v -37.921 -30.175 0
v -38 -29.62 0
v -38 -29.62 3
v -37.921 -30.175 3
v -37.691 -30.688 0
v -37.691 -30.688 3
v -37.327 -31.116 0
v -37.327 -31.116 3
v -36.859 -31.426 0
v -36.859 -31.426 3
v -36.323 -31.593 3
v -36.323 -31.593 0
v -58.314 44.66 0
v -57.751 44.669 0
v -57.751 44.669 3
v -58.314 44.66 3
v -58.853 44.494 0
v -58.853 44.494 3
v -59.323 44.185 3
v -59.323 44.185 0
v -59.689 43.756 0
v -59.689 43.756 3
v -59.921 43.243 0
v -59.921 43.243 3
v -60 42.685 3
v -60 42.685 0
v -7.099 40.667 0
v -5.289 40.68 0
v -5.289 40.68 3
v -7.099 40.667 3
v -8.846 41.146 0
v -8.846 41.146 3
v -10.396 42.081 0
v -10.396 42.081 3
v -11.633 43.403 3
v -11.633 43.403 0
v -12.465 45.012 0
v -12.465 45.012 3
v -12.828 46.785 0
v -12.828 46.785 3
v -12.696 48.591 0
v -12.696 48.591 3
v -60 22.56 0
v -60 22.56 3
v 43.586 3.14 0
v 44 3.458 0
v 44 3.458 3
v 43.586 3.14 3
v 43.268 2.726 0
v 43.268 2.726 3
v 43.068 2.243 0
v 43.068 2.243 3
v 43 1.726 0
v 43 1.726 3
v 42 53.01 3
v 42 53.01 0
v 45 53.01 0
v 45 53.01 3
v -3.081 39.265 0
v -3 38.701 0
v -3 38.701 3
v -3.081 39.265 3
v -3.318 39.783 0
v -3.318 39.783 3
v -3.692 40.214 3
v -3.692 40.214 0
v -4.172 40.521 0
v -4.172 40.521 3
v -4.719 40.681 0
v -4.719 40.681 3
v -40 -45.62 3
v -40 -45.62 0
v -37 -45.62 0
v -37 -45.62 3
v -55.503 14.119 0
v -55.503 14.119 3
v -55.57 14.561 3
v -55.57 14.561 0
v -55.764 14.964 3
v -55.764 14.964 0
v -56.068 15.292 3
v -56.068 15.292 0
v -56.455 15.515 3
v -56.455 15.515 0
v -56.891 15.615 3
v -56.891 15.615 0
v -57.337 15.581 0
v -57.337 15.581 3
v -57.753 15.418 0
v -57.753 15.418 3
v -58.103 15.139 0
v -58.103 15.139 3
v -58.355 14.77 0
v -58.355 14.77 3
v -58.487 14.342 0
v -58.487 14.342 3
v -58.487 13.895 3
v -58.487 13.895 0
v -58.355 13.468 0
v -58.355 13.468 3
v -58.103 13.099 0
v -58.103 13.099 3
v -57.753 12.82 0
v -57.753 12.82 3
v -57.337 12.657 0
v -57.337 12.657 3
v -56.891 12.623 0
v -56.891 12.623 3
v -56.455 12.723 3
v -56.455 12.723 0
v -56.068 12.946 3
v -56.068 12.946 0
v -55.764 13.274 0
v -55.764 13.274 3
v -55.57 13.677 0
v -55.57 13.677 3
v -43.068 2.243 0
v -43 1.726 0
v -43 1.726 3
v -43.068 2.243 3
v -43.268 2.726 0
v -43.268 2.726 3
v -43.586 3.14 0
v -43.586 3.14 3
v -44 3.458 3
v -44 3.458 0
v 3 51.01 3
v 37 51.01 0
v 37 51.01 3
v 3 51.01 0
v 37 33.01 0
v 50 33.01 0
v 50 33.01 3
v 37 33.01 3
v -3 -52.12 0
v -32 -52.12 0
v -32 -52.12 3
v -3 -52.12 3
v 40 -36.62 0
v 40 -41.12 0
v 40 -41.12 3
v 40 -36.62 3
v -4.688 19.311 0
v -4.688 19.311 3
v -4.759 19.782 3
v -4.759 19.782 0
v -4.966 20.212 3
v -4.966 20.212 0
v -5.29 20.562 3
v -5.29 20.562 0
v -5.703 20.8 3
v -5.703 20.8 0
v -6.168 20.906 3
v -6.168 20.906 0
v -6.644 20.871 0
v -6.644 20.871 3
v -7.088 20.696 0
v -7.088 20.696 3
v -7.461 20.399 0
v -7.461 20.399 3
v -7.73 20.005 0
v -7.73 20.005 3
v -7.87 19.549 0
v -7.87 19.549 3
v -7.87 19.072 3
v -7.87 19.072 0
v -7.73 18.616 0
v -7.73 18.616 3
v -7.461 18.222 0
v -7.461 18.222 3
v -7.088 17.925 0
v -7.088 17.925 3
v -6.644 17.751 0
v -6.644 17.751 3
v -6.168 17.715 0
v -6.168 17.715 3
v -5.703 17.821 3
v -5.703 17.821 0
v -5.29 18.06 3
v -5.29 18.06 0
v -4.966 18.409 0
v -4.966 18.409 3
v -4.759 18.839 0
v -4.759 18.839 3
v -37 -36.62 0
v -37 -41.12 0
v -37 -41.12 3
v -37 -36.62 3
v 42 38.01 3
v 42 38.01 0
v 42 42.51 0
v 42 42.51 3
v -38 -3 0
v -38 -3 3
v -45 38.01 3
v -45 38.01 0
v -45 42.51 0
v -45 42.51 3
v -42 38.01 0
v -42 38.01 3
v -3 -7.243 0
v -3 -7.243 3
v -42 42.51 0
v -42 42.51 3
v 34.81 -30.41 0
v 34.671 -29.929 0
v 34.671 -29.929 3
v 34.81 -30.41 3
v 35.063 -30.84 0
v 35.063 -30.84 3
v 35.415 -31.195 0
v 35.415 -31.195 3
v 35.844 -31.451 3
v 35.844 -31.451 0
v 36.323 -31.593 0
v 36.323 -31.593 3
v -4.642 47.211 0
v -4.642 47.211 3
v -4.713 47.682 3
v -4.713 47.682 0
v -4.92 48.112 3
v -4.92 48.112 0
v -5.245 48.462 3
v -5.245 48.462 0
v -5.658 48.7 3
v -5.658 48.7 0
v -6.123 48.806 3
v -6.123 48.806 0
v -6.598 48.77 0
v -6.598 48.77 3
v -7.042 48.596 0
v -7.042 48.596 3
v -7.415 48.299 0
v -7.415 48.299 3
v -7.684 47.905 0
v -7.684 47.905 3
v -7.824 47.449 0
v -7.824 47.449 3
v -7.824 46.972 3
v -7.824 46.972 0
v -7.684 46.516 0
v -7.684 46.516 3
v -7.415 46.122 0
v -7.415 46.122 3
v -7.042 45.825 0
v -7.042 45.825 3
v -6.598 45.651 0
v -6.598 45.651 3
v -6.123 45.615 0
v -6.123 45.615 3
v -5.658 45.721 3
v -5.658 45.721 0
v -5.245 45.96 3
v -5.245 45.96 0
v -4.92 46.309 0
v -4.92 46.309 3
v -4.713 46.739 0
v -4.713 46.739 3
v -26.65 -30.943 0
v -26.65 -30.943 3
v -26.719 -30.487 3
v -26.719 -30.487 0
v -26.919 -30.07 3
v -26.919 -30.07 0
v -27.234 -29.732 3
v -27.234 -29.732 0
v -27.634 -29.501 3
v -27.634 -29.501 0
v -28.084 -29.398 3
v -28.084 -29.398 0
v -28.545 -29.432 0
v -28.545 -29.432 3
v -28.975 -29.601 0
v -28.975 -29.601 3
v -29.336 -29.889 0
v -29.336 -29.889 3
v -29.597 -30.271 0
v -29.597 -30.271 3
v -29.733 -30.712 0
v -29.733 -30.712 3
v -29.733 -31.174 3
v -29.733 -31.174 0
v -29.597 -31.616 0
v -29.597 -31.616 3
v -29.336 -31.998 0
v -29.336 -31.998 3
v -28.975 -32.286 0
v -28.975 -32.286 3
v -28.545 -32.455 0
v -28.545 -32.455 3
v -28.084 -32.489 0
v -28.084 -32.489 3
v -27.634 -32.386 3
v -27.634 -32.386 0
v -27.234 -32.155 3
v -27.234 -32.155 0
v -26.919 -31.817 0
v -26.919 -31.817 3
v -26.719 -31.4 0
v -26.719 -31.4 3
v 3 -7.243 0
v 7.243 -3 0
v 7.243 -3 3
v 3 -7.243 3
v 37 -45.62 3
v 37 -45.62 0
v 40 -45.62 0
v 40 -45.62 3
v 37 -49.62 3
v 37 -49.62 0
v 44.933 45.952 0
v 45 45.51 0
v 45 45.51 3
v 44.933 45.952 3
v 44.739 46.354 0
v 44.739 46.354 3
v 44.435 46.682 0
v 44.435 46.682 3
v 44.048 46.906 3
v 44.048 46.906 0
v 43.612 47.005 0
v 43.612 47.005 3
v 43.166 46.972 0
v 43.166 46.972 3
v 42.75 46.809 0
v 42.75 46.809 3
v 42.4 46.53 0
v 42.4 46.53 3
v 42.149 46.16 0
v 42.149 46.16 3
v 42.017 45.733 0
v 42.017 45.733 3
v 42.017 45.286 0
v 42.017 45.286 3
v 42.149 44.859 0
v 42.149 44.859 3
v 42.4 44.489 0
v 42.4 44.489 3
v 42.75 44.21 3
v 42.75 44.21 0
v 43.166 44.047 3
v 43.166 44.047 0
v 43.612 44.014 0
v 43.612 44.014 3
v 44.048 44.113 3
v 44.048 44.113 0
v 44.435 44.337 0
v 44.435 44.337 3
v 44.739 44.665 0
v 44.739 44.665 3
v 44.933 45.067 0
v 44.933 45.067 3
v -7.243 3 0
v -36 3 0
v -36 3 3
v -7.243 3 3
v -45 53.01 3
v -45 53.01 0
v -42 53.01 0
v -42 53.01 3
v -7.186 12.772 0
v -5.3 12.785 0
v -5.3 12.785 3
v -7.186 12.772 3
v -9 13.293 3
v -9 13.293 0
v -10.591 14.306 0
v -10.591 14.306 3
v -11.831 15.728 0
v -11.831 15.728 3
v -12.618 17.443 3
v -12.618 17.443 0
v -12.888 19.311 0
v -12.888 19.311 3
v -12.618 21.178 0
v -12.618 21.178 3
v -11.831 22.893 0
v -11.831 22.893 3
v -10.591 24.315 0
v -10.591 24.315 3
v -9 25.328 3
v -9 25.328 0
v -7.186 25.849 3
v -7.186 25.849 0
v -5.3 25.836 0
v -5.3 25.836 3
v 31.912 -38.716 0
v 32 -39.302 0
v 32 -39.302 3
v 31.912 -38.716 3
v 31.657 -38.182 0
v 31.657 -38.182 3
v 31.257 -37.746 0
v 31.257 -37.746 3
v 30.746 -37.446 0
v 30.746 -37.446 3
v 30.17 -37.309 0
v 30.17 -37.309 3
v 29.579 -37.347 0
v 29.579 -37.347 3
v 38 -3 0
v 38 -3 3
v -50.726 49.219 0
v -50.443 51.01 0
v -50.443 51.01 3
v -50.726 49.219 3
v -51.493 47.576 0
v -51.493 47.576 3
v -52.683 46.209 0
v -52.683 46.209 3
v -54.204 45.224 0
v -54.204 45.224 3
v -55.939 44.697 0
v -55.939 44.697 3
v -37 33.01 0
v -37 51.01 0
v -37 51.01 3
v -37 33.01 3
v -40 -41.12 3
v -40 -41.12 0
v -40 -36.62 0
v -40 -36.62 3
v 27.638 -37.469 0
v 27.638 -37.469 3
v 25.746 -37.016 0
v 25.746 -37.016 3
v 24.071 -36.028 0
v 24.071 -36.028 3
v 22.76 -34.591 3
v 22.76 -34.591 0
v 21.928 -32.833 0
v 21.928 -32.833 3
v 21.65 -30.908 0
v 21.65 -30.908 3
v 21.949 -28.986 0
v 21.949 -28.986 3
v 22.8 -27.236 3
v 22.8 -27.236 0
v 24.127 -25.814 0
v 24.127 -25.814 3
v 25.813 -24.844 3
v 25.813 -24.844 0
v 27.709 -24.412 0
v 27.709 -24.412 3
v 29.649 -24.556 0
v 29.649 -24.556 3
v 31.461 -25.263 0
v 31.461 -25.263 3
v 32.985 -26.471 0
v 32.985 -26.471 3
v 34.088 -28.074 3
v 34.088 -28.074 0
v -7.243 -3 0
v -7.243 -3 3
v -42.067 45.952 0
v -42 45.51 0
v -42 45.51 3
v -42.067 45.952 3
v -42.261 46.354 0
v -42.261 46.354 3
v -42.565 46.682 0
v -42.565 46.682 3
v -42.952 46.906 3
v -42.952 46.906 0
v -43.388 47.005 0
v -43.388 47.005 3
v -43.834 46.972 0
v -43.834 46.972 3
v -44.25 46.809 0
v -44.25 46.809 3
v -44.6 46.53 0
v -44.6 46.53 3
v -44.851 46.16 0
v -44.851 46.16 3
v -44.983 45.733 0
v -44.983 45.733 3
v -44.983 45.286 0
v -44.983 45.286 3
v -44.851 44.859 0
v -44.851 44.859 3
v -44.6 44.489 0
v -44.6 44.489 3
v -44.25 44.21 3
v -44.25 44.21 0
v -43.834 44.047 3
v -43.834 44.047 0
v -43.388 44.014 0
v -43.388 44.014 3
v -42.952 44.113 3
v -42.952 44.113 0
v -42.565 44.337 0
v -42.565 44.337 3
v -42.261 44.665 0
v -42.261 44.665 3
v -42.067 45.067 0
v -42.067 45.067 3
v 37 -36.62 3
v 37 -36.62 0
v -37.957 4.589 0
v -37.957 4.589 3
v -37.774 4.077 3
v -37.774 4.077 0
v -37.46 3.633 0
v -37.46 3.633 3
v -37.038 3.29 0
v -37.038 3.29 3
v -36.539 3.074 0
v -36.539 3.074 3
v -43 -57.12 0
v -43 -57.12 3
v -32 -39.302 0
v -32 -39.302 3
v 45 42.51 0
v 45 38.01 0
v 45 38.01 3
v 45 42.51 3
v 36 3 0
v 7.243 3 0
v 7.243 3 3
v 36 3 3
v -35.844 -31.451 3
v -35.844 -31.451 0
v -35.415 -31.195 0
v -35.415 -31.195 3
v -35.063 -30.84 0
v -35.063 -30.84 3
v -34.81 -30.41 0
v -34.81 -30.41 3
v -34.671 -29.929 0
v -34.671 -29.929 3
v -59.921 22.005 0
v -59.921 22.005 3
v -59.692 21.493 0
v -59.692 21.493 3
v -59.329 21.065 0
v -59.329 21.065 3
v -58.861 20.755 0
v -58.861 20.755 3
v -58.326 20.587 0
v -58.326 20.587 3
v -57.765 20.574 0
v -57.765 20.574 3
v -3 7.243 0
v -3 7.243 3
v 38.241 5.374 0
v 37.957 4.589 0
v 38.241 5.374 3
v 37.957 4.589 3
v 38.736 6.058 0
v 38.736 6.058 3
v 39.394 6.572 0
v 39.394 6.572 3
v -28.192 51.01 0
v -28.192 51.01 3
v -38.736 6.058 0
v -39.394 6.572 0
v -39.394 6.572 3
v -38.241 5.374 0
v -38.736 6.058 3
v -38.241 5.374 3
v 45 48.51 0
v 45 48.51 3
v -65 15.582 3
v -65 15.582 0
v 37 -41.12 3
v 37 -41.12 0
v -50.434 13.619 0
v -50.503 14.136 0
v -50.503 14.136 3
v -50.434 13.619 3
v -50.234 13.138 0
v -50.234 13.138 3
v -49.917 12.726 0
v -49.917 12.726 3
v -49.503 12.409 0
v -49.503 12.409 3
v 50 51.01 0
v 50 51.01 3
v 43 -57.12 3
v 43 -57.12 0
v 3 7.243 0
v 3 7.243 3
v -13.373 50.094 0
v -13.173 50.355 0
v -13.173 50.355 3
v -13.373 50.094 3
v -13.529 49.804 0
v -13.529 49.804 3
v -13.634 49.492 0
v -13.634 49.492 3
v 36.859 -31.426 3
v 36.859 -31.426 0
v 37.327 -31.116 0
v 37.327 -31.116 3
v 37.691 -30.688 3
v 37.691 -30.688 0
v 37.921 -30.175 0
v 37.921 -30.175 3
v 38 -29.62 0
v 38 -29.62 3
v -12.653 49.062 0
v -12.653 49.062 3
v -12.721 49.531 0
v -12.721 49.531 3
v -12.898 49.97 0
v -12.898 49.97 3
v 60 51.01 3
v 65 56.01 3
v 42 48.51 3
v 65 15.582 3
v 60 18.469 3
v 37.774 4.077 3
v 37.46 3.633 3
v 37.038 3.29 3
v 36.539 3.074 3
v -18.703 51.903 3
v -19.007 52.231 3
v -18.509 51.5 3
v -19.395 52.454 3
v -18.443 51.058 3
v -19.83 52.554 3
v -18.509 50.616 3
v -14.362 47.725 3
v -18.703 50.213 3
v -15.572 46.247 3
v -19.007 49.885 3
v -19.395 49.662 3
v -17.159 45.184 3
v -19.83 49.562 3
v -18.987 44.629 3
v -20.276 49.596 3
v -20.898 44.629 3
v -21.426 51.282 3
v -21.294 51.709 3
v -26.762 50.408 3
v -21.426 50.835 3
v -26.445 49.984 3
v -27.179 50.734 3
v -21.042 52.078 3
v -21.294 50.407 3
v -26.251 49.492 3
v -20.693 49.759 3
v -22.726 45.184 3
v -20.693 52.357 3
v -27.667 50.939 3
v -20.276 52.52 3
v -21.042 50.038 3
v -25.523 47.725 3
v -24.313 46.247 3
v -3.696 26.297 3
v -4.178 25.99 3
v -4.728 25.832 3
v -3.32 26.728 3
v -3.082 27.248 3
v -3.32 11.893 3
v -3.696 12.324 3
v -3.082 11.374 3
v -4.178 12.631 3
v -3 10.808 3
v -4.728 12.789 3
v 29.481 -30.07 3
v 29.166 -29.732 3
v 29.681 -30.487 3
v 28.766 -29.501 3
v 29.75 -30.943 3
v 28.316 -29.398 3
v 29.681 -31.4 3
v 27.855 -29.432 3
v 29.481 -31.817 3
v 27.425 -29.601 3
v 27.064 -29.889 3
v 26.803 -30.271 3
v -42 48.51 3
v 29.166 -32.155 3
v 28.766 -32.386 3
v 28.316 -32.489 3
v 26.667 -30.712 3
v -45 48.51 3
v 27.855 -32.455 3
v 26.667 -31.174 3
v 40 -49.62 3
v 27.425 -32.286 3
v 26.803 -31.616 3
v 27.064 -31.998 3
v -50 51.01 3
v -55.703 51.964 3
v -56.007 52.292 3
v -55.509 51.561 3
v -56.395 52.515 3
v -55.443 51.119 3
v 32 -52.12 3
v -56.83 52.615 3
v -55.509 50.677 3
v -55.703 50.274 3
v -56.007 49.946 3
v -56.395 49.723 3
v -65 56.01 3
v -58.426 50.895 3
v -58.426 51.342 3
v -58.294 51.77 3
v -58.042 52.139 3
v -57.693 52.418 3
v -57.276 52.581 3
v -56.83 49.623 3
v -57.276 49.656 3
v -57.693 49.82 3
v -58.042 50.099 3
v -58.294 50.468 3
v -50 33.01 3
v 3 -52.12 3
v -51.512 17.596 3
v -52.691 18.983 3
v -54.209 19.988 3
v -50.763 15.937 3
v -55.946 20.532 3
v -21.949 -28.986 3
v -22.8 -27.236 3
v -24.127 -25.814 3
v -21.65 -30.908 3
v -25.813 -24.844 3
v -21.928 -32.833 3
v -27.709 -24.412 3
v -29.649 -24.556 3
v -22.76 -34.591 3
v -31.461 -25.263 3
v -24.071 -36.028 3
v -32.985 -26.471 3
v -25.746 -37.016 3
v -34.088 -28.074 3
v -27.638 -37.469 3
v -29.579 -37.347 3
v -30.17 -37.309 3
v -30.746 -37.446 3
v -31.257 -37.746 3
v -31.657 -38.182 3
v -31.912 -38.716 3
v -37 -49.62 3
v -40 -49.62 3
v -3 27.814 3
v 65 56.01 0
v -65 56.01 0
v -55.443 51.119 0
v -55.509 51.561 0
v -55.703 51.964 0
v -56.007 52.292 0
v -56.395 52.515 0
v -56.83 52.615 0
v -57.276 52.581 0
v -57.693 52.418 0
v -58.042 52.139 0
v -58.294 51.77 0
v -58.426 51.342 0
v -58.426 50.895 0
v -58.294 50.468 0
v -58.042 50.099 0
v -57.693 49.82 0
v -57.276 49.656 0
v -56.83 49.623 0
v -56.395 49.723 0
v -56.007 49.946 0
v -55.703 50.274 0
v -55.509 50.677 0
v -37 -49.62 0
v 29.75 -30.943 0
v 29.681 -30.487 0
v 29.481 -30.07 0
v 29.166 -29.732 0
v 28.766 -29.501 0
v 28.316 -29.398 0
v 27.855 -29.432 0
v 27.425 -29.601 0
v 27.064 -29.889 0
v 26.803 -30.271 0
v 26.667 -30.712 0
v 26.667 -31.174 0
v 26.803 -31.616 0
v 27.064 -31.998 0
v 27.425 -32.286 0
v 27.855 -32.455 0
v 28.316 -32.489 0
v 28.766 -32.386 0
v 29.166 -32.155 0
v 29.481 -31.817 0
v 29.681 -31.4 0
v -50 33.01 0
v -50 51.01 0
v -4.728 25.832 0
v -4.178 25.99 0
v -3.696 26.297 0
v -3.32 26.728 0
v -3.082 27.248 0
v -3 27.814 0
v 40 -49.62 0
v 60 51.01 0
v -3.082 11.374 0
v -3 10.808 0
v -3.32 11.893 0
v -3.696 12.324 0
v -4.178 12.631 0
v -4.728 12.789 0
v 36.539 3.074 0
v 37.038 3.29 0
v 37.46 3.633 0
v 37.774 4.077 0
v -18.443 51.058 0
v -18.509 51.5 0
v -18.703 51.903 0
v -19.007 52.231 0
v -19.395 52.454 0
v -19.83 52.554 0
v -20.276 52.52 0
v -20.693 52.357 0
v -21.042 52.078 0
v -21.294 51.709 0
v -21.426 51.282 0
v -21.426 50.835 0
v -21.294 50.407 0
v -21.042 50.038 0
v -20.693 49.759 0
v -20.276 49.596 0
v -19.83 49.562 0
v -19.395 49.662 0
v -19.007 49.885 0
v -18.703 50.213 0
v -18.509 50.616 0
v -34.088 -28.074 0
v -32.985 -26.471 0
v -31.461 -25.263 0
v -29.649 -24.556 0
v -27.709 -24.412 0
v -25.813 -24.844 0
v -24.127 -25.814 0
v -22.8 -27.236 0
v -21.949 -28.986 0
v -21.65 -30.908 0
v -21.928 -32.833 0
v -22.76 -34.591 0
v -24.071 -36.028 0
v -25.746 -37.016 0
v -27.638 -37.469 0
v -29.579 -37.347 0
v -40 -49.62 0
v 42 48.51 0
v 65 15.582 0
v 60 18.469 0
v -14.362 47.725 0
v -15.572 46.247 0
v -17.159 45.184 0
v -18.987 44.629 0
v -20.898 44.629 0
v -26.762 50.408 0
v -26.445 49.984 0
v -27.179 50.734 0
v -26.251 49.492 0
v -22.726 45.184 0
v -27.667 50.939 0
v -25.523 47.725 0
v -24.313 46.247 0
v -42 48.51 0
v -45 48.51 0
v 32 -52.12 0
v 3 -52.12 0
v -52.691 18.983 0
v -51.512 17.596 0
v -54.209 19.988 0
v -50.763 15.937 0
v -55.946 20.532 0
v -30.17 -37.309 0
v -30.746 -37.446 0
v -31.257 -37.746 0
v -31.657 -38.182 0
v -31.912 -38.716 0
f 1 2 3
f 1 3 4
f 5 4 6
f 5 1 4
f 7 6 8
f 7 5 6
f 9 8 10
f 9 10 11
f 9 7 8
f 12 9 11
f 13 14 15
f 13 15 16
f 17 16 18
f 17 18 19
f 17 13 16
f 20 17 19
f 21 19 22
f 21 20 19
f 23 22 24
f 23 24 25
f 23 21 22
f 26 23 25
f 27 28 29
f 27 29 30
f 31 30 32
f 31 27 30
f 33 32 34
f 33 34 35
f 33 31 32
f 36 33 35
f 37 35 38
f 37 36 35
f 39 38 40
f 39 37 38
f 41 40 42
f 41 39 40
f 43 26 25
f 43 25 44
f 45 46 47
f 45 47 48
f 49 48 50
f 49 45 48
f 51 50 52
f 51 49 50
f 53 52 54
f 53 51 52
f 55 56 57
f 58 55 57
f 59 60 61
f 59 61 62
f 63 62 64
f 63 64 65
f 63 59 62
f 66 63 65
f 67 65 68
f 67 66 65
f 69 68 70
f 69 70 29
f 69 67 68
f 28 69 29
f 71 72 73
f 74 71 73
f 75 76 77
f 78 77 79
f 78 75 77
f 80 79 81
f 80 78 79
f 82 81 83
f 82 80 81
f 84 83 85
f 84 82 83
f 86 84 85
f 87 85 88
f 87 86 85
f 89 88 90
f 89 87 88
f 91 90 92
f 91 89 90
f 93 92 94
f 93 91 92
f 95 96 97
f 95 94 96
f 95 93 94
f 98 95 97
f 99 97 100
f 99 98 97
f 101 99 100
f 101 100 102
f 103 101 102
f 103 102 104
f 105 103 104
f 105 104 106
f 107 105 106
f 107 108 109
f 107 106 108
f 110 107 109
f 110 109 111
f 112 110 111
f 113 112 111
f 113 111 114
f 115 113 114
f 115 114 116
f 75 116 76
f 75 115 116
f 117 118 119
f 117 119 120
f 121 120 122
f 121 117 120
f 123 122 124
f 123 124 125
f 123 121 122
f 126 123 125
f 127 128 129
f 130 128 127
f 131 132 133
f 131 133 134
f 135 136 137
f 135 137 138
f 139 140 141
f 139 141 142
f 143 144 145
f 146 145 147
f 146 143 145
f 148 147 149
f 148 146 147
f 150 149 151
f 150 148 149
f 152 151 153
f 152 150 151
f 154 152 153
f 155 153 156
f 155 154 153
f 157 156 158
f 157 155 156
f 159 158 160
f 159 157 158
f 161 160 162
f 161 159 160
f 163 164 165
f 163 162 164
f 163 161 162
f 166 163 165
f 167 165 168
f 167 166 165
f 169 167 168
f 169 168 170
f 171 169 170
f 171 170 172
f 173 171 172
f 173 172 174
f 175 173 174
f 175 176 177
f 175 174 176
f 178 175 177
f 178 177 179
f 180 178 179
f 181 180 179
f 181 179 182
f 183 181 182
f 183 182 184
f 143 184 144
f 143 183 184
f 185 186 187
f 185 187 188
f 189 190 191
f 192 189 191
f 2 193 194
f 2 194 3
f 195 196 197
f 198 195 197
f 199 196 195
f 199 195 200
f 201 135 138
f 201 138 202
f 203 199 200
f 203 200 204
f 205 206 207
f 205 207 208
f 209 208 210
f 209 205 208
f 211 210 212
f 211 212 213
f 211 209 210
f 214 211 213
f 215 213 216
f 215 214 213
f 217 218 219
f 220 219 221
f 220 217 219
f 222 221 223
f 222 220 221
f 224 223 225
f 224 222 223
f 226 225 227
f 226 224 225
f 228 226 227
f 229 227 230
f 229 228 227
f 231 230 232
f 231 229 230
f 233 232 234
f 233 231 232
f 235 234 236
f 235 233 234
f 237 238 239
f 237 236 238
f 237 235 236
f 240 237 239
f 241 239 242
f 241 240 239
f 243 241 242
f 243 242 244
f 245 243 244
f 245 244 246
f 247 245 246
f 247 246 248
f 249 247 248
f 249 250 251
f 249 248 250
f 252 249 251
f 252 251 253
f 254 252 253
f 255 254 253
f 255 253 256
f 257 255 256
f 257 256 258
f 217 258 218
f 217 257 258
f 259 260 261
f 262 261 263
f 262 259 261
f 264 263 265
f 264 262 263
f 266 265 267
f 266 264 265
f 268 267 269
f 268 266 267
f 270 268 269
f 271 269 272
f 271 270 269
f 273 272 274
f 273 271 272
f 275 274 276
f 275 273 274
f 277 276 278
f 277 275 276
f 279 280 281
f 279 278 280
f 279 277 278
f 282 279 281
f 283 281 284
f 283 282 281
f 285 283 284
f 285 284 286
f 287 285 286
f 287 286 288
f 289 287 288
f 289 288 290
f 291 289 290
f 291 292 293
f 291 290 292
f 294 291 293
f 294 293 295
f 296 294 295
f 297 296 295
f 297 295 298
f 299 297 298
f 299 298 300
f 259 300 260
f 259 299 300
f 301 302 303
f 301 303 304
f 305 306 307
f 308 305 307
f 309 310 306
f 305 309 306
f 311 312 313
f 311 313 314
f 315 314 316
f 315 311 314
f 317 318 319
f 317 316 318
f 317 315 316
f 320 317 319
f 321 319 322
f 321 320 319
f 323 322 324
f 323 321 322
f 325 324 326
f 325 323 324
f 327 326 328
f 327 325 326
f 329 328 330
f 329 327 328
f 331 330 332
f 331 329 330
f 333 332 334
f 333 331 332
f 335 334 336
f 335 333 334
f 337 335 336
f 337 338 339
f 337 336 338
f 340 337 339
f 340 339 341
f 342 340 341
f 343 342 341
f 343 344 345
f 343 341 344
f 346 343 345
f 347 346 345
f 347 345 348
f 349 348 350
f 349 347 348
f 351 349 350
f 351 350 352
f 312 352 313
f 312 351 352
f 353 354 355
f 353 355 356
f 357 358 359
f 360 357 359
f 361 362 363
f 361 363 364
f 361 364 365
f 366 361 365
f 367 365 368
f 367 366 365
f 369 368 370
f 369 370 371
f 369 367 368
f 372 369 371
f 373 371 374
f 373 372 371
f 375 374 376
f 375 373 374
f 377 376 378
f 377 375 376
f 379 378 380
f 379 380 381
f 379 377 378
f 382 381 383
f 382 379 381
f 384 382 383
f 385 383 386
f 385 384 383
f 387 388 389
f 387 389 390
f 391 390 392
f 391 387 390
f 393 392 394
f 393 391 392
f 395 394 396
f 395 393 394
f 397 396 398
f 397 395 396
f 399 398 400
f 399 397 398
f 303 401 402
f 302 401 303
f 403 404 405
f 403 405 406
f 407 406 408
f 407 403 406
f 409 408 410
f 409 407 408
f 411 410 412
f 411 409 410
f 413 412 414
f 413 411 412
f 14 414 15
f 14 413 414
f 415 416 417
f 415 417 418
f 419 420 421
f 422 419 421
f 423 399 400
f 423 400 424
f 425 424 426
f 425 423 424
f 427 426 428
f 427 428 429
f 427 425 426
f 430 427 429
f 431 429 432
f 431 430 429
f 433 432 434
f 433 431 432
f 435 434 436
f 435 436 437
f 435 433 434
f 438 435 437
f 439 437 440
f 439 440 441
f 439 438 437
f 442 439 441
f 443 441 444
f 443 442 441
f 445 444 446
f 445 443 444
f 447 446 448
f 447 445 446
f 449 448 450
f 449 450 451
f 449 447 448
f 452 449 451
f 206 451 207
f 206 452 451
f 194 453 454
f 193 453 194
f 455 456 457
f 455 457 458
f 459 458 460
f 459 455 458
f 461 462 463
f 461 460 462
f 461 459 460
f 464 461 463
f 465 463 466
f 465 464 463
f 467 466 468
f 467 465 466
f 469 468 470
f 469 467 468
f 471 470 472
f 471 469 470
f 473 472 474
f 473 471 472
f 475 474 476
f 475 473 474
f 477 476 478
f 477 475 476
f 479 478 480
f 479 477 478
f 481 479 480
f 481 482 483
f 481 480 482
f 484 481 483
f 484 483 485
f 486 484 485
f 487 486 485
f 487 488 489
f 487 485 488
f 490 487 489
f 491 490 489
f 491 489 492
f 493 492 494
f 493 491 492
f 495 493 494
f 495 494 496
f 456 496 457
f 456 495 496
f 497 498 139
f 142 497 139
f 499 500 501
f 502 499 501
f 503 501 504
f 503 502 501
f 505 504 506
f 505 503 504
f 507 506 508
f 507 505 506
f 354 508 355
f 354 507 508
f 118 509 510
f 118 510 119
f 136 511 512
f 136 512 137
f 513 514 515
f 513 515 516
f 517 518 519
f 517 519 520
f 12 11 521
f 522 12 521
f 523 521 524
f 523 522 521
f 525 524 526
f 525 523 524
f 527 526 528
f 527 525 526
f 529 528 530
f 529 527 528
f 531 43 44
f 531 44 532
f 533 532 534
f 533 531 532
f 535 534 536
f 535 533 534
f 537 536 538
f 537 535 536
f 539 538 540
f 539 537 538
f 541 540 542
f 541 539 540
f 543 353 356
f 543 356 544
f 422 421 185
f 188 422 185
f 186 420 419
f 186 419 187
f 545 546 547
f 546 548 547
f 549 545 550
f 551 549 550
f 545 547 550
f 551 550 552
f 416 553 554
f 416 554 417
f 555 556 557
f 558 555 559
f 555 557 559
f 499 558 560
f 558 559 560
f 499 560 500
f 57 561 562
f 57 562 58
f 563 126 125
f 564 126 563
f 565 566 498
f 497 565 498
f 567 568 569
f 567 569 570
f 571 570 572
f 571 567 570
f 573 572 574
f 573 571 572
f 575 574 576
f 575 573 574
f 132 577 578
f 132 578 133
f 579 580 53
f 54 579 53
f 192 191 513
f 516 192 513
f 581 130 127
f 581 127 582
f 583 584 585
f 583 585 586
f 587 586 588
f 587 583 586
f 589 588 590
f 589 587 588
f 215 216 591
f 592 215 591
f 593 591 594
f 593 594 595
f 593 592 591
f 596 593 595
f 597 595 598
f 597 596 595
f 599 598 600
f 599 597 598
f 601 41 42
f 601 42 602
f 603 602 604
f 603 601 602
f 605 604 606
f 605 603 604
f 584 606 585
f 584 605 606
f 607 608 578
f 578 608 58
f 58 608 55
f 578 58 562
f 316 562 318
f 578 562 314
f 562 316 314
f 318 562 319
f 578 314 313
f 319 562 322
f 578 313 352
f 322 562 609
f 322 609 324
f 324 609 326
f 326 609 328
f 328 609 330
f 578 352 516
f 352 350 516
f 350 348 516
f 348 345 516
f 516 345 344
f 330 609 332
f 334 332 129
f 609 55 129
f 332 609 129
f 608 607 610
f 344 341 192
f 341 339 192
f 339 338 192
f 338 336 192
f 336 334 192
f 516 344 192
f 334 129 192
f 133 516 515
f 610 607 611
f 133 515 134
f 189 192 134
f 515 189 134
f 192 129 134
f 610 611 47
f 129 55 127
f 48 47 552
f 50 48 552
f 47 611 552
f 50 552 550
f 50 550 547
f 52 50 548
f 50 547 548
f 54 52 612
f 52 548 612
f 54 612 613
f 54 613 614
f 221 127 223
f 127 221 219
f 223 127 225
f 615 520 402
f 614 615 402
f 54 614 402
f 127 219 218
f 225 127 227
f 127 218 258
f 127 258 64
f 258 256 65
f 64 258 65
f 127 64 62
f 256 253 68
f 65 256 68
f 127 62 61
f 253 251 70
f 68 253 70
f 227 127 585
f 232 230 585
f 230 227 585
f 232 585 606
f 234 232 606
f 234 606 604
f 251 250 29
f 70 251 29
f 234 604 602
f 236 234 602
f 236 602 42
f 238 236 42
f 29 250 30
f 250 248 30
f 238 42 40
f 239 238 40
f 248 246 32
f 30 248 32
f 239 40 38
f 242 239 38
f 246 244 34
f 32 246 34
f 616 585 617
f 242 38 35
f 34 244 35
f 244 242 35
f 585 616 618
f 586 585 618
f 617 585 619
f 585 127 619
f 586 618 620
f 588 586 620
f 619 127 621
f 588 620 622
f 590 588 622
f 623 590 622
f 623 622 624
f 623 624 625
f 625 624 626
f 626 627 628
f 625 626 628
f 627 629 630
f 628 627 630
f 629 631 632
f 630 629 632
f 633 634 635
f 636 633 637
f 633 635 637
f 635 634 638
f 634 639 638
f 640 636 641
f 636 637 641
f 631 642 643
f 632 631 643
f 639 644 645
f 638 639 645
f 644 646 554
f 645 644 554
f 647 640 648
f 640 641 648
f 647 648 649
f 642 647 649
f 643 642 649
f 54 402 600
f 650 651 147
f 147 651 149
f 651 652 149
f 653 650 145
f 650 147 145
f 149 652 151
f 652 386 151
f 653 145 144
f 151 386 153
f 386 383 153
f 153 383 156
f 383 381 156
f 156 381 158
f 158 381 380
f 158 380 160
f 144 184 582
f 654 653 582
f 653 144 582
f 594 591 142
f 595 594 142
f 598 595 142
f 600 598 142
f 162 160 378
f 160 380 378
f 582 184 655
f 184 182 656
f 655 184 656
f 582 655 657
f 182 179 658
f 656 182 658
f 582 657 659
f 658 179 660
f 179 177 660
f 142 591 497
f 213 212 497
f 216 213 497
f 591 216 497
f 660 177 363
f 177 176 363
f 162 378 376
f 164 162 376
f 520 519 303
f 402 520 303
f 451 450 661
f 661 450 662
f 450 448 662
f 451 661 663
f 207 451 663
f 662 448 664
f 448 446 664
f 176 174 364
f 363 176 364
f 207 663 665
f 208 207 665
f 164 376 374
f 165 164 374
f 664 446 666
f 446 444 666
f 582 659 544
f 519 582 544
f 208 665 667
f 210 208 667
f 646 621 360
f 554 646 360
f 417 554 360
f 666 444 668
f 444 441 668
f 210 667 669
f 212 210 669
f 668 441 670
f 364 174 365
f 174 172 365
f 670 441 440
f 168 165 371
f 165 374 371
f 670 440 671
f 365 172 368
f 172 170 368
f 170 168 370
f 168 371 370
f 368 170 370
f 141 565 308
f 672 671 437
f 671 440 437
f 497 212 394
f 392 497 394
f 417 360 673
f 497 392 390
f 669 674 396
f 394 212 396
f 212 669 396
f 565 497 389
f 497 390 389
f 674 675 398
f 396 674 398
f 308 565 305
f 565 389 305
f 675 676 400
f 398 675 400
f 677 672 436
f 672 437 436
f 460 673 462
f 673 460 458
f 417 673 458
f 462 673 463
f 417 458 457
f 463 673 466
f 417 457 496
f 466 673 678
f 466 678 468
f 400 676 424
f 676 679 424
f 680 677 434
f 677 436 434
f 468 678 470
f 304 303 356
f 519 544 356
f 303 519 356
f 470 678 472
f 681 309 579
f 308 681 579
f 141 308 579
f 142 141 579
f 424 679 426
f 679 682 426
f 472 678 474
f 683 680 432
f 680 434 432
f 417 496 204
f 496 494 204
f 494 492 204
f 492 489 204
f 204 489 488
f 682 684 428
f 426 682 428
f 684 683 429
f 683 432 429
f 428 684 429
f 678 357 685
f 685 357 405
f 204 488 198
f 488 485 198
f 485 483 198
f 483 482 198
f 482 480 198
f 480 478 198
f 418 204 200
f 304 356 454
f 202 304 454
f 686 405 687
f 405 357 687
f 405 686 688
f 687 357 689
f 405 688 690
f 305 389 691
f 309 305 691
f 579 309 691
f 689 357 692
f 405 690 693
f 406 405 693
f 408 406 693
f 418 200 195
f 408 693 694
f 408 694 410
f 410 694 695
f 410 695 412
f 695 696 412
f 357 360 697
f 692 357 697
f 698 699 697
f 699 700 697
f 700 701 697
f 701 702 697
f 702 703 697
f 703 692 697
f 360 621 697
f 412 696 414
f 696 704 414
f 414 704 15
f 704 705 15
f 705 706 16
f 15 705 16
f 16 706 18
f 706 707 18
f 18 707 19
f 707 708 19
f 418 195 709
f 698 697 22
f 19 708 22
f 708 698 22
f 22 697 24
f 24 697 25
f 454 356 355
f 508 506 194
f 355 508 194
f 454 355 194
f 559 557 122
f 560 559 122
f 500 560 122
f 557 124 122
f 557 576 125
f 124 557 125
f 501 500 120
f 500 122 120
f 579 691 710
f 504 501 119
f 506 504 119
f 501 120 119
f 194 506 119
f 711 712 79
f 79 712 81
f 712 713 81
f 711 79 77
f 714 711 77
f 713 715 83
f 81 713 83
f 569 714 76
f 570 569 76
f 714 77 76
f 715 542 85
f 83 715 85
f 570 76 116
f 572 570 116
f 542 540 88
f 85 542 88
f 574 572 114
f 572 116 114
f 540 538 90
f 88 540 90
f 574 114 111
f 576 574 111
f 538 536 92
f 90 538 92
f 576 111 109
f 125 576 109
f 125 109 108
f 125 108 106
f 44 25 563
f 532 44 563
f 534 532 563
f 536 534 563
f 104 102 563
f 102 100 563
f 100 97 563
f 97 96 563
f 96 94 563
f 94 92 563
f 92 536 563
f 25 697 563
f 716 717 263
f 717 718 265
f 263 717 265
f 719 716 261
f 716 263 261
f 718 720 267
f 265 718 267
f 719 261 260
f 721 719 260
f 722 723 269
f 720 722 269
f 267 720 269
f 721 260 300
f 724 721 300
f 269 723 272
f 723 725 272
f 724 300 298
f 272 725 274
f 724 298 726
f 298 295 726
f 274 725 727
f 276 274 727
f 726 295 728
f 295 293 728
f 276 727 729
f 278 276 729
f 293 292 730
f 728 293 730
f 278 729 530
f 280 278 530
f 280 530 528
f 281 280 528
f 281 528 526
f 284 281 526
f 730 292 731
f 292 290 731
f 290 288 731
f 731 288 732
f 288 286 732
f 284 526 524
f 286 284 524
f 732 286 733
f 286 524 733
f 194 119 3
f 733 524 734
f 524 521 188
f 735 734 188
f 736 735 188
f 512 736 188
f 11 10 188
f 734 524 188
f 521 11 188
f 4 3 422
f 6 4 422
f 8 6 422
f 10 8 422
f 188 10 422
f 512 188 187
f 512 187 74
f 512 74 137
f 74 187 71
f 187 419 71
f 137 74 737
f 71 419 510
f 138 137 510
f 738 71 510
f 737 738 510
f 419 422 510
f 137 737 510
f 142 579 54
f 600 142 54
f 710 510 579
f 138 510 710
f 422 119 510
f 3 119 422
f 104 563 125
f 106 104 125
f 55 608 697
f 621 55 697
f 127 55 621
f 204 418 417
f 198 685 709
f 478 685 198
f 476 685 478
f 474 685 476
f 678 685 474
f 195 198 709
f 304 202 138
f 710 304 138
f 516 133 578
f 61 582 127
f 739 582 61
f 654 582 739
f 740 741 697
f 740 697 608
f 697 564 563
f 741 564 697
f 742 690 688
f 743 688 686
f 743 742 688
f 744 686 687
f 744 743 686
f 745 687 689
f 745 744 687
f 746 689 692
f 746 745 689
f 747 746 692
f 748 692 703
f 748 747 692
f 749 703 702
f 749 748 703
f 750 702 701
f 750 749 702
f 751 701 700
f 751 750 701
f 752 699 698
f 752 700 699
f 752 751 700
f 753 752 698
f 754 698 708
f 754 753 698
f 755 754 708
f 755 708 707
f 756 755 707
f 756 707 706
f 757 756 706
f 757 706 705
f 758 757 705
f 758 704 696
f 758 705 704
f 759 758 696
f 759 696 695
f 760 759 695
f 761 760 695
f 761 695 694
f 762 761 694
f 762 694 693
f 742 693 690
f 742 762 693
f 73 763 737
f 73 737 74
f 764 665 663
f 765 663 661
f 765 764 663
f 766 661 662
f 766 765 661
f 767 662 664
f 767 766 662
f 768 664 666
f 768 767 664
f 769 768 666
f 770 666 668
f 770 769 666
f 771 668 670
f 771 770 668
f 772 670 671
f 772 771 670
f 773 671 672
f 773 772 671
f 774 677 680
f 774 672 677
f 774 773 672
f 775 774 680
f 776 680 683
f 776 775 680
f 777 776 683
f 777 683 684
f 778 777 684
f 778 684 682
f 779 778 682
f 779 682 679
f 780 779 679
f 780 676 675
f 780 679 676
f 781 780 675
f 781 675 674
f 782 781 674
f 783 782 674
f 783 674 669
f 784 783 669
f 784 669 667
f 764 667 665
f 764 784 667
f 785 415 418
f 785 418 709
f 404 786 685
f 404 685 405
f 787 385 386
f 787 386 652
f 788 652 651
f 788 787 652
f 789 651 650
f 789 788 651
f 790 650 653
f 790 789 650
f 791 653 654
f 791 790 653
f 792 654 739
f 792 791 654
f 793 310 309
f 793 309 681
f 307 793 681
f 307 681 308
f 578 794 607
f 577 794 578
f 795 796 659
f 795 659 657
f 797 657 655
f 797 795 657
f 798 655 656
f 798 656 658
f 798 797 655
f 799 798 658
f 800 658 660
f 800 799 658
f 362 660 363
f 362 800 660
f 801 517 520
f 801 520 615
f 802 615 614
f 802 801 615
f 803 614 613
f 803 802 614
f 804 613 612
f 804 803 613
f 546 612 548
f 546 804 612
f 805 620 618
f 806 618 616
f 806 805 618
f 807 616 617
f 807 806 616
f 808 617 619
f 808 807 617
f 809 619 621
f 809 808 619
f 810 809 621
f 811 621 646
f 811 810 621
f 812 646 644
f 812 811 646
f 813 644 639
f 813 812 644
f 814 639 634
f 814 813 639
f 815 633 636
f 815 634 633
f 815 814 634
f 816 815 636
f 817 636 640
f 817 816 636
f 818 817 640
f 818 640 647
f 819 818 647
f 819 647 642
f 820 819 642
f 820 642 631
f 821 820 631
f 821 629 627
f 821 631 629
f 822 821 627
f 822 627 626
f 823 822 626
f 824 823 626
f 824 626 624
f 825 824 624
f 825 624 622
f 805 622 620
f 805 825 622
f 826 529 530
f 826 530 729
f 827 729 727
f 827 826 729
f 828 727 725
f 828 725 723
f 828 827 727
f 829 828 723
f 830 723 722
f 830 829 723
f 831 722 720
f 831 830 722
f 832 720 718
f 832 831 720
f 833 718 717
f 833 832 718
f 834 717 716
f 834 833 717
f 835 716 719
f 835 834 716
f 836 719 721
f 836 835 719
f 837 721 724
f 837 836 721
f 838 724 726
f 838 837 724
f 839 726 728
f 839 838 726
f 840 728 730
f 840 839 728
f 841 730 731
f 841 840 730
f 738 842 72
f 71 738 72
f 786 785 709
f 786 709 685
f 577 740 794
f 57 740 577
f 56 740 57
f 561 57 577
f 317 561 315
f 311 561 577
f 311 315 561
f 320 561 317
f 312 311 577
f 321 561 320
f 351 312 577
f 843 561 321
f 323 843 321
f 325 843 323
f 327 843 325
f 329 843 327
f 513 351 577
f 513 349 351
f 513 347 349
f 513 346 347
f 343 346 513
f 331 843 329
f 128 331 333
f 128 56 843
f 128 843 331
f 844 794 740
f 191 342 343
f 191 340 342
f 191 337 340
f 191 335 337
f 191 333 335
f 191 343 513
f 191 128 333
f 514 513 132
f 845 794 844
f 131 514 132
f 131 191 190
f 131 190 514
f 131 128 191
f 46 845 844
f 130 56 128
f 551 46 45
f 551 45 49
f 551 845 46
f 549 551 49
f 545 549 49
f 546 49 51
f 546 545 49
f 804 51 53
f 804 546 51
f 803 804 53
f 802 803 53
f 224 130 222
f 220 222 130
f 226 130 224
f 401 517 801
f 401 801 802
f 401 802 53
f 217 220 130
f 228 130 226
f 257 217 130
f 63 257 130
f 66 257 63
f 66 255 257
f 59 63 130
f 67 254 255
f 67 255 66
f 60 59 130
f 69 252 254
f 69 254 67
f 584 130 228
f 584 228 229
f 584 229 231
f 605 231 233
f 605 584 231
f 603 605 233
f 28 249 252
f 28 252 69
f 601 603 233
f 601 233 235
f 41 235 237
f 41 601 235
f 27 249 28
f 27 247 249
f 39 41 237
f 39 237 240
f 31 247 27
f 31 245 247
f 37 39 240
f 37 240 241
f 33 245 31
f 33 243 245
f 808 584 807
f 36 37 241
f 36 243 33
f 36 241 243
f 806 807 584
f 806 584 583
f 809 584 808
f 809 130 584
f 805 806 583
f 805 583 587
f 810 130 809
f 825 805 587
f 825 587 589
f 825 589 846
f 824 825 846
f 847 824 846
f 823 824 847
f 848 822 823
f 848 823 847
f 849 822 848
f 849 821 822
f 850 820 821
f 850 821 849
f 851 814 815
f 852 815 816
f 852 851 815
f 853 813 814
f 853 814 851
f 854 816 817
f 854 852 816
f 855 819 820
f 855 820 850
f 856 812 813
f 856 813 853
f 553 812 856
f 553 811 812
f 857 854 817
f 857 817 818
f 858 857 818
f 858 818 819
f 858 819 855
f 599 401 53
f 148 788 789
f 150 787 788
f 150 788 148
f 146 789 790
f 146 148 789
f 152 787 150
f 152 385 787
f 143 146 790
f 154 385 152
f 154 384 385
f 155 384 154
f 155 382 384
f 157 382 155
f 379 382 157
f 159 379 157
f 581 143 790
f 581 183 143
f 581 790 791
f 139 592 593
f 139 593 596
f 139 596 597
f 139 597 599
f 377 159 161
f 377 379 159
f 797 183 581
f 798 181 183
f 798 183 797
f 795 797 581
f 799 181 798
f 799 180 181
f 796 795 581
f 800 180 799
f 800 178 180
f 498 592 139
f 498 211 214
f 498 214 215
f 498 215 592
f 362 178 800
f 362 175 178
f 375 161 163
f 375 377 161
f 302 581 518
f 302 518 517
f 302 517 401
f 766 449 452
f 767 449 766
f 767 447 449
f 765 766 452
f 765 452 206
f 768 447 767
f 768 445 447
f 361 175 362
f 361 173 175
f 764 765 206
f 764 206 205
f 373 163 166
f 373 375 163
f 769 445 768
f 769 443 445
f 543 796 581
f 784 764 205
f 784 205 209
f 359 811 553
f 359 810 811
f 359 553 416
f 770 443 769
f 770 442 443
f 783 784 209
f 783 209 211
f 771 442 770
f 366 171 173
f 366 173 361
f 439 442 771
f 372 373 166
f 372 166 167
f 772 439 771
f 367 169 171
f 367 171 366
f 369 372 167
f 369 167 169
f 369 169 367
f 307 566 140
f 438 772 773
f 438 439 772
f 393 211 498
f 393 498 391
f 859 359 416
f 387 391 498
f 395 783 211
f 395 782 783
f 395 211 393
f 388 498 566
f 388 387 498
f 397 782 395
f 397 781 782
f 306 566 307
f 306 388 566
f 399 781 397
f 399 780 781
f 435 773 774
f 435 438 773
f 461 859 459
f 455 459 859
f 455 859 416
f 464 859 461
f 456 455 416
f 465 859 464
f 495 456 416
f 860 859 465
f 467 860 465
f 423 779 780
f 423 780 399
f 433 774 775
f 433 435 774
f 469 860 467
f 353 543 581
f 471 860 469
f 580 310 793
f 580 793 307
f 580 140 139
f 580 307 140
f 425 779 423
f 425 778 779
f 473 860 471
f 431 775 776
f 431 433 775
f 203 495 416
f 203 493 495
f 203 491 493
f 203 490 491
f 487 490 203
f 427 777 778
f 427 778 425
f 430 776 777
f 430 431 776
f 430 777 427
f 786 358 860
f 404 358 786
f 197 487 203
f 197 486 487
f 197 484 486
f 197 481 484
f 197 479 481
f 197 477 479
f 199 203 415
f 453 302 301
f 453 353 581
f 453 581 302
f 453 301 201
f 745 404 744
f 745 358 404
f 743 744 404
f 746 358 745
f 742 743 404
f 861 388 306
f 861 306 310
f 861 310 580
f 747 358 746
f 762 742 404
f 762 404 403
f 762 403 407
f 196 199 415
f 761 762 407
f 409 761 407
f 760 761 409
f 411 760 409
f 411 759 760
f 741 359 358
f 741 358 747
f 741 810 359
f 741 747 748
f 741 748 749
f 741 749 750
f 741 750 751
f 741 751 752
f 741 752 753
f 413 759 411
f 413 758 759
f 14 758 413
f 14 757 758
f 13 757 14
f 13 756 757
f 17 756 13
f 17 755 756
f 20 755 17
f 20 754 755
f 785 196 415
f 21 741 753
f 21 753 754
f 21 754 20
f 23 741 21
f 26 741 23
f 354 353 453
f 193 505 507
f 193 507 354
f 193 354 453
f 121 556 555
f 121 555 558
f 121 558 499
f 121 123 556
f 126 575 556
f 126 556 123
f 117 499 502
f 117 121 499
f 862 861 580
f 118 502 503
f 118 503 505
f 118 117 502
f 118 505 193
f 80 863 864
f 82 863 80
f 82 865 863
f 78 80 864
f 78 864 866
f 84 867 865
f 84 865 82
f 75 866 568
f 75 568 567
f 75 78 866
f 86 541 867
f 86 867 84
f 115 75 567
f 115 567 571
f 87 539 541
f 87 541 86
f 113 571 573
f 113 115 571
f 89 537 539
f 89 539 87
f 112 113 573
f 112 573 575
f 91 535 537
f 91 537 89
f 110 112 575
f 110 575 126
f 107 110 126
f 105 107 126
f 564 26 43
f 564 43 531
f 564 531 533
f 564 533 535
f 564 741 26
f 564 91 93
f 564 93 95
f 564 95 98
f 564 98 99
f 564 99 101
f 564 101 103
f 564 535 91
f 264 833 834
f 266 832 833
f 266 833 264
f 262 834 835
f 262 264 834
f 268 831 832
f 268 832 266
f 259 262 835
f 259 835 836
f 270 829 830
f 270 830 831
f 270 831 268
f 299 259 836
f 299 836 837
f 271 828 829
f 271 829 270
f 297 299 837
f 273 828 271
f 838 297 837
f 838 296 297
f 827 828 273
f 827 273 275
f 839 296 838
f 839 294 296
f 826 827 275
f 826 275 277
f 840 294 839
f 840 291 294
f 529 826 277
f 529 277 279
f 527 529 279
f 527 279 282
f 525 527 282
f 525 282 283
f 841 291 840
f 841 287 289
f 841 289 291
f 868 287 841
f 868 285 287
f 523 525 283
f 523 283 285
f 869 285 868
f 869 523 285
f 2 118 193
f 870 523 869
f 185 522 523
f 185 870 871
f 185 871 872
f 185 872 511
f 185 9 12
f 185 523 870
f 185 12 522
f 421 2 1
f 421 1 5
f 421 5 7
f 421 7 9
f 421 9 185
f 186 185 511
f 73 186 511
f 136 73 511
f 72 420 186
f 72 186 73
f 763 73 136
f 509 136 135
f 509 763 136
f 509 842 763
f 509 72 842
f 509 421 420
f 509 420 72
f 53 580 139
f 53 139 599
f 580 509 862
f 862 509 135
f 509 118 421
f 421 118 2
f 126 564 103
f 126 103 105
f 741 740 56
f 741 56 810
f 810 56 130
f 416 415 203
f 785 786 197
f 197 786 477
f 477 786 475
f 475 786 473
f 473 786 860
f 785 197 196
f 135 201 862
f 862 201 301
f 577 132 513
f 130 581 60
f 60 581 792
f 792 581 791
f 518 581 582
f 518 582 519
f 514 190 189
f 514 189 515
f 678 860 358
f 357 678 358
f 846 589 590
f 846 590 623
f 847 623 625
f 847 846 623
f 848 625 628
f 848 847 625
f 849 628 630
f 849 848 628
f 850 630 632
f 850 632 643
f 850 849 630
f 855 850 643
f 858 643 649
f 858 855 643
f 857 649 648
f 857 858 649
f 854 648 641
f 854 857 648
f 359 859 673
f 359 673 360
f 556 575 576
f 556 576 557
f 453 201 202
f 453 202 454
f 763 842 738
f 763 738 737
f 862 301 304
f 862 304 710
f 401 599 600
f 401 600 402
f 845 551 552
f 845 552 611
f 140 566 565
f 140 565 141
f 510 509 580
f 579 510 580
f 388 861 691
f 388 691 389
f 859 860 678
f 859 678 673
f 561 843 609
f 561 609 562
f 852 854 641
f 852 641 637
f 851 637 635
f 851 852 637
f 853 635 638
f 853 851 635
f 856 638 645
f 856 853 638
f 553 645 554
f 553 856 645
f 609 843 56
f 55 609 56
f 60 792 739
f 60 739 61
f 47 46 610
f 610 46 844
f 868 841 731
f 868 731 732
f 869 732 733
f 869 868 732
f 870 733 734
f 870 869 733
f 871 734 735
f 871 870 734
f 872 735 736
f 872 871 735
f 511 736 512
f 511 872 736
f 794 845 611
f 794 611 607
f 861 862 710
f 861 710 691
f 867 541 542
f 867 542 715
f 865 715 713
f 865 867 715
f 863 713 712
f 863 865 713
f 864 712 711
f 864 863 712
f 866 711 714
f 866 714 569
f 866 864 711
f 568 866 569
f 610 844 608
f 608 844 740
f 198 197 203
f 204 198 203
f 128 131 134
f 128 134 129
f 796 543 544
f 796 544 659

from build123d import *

# Parameters (mm, degrees)
CROQUIS1_W                 = 130
CROQUIS1_H                 = 113.129079584
CROQUIS1_W_2               = 3
CROQUIS1_H_2               = 1.5
CROQUIS1_H_3               = 4.5
SALIENTE_EXTRUIR1_DEPTH    = 3
CORTAR_EXTRUIR1_DEPTH      = 3
CROQUIS7_R                 = 1.55
CROQUIS7_R_2               = 1.6
CROQUIS7_R_3               = 1.5
CORTAR_EXTRUIR3_DEPTH      = 10
CORTAR_EXTRUIR4_DEPTH      = 10
CROQUIS9_W                 = 3
CROQUIS9_H                 = 4
CORTAR_EXTRUIR5_DEPTH      = 10
CORTAR_EXTRUIR6_DEPTH      = 87.58316764
CORTAR_EXTRUIR6_DEPTH_BACK = 87.58316764
CROQUIS10_R                = 1.5
REDONDEO1_R                = 2
REDONDEO2_R                = 3


with BuildPart() as part:
    # Croquis1 → Saliente-Extruir1 (new body)
    with BuildSketch(Plane.XY):
        with Locations((0, -0.555027071)):
            Rectangle(CROQUIS1_W, CROQUIS1_H)
        with Locations((38.5, -46.369566863)):
            Rectangle(CROQUIS1_W_2, CROQUIS1_H_2, mode=Mode.SUBTRACT)
        with Locations((-38.5, -46.369566863)):
            Rectangle(CROQUIS1_W_2, CROQUIS1_H_2, mode=Mode.SUBTRACT)
        with Locations((38.5, -38.869566863)):
            Rectangle(CROQUIS1_W_2, CROQUIS1_H_3, mode=Mode.SUBTRACT)
        with Locations((-38.5, -38.869566863)):
            Rectangle(CROQUIS1_W_2, CROQUIS1_H_3, mode=Mode.SUBTRACT)
        with Locations((43.5, 40.259512721)):
            Rectangle(CROQUIS1_W_2, CROQUIS1_H_3, mode=Mode.SUBTRACT)
        with Locations((43.5, 50.759512721)):
            Rectangle(CROQUIS1_W_2, CROQUIS1_H_3, mode=Mode.SUBTRACT)
        with Locations((-43.5, 40.259512721)):
            Rectangle(CROQUIS1_W_2, CROQUIS1_H_3, mode=Mode.SUBTRACT)
        with Locations((-43.5, 50.759512721)):
            Rectangle(CROQUIS1_W_2, CROQUIS1_H_3, mode=Mode.SUBTRACT)
    extrude(amount=SALIENTE_EXTRUIR1_DEPTH)

    # Croquis2 → Cortar-Extruir1 (cut)
    with BuildSketch(Plane.XY):
        Polygon((-43, -57.119566863), (-43, 2.880433137), (-65, 15.582139059), (-65, -57.119566863), align=None)
    cortar_extruir1 = extrude(amount=CORTAR_EXTRUIR1_DEPTH, mode=Mode.SUBTRACT)

    # Simetría1: Cortar-Extruir1 across plane
    add(cortar_extruir1.mirror(Plane(origin=(0, 0, 0), x_dir=(0, 0, 1), z_dir=(1, 0, 0))), mode=Mode.SUBTRACT)

    # Croquis7 → Cortar-Extruir3 (cut)
    with BuildSketch(Plane.XY):
        with Locations((-28.2, -30.943433351)):
            Circle(CROQUIS7_R)
        with Locations((28.2, -30.943433351)):
            Circle(CROQUIS7_R)
        with Locations((-6.242176561, 47.210601794)):
            Circle(CROQUIS7_R_2)
        with Locations((-6.287991701, 19.310639411)):
            Circle(CROQUIS7_R_2)
        with Locations((-57.003272906, 14.118912973)):
            Circle(CROQUIS7_R_3)
        with Locations((-19.942564364, 51.058104658)):
            Circle(CROQUIS7_R_3)
        with Locations((-56.942514477, 51.118863087)):
            Circle(CROQUIS7_R_3)
    extrude(amount=CORTAR_EXTRUIR3_DEPTH, mode=Mode.SUBTRACT)

    # Croquis8 → Cortar-Extruir4 (cut)
    with BuildSketch(Plane.XY):
        Polygon((37, 33.009512721), (37, 51.009512721), (3, 51.009512721), (3, 7.242640687), (7.242640687, 3), (38, 3), (38, 5.767184483), (60, 18.468890405), (60, 51.009512721), (50, 51.009512721), (50, 33.009512721), align=None)
        with BuildLine():
            Line((-7.242640687, 3), (-3, 7.242640687))
            Line((-3, 7.242640687), (-3, 13.58795555))
            ThreePointArc((-3, 13.58795555), (-12.887991701, 19.310639411), (-3, 25.033323272))
            Line((-3, 25.033323272), (-3, 41.461837479))
            ThreePointArc((-3, 41.461837479), (-11.136091988, 42.782329919), (-11.639238333, 51.009512721))
            Line((-11.639238333, 51.009512721), (-13.442745995, 51.009512721))
            ThreePointArc((-13.442745995, 51.009512721), (-19.942564364, 44.558104658), (-26.442382732, 51.009512721))
            Line((-26.442382732, 51.009512721), (-37, 51.009512721))
            Line((-37, 51.009512721), (-37, 33.009512721))
            Line((-37, 33.009512721), (-50, 33.009512721))
            Line((-50, 33.009512721), (-50, 51.009512721))
            Line((-50, 51.009512721), (-50.44343435, 51.009512721))
            ThreePointArc((-50.44343435, 51.009512721), (-53.644642278, 45.517609749), (-60, 45.382855566))
            Line((-60, 45.382855566), (-60, 19.886895872))
            ThreePointArc((-60, 19.886895872), (-53.177308637, 19.373624897), (-50.59374625, 13.03818727))
            Line((-50.59374625, 13.03818727), (-38, 5.767184483))
            Line((-38, 5.767184483), (-38, 3))
            Line((-38, 3), (-7.242640687, 3))
        make_face()
        with BuildLine():
            Line((38, -3), (7.242640687, -3))
            Line((7.242640687, -3), (3, -7.242640687))
            Line((3, -7.242640687), (3, -52.119566863))
            Line((3, -52.119566863), (32, -52.119566863))
            Line((32, -52.119566863), (32, -36.278459124))
            ThreePointArc((32, -36.278459124), (22.540832887, -27.64550558), (34.715009092, -31.619566863))
            Line((34.715009092, -31.619566863), (38, -31.619566863))
            Line((38, -31.619566863), (38, -3))
        make_face()
        with BuildLine():
            Line((-3, -7.242640687), (-7.242640687, -3))
            Line((-7.242640687, -3), (-38, -3))
            Line((-38, -3), (-38, -31.619566863))
            Line((-38, -31.619566863), (-34.715009092, -31.619566863))
            ThreePointArc((-34.715009092, -31.619566863), (-22.540832887, -27.64550558), (-32, -36.278459124))
            Line((-32, -36.278459124), (-32, -52.119566863))
            Line((-32, -52.119566863), (-3, -52.119566863))
            Line((-3, -52.119566863), (-3, -7.242640687))
        make_face()
    extrude(amount=CORTAR_EXTRUIR4_DEPTH, mode=Mode.SUBTRACT)

    # Croquis9 → Cortar-Extruir5 (cut)
    with BuildSketch(Plane.XY):
        with Locations((-38.5, -47.619566863)):
            Rectangle(CROQUIS9_W, CROQUIS9_H)
        with Locations((38.5, -47.619566863)):
            Rectangle(CROQUIS9_W, CROQUIS9_H)
    extrude(amount=CORTAR_EXTRUIR5_DEPTH, mode=Mode.SUBTRACT)

    # Croquis10 → Cortar-Extruir6 (cut, two sides: drawn at the far end of the back side and taken through both)
    with BuildSketch(Plane.XY.offset(-CORTAR_EXTRUIR6_DEPTH_BACK)):
        with Locations((43.5, 45.509512721)):
            Circle(CROQUIS10_R)
        with Locations((-43.5, 45.509512721)):
            Circle(CROQUIS10_R)
    extrude(amount=CORTAR_EXTRUIR6_DEPTH + CORTAR_EXTRUIR6_DEPTH_BACK, mode=Mode.SUBTRACT)

    # Redondeo1
    # the kernel refuses this fillet: 2 mm, written as the material it adds along each edge
    with BuildSketch(Plane(origin=(32, -36.278459124, 0), x_dir=(-0.9149086715466047, -0.40366090066889926, 0), z_dir=(0, 0, 1))) as redondeo1_piece_1:
        with BuildLine():
            CenterArc((3.050226842, 1.95877031), REDONDEO1_R, 156.192760529, 102.153197469)
            Line((1.220409498, 2.766092111), (0, 0))
            ThreePointArc((0, 0), (1.323111643, 0.135027235), (2.646223286, 0))
        make_face()
    extrude(amount=3)
    with BuildSketch(Plane(origin=(38, -31.619566863, 0), x_dir=(-1, 0, 0), z_dir=(0, 0, 1)), Plane(origin=(-38, -31.619566863, 0), x_dir=(0, 1, 0), z_dir=(0, 0, 1)), Plane(origin=(-38, 3, 0), x_dir=(0, 1, 0), z_dir=(0, 0, 1))) as redondeo1_piece_2:
        with BuildLine():
            CenterArc((REDONDEO1_R, -REDONDEO1_R), REDONDEO1_R, 90, 90)
            Line((0, -REDONDEO1_R), (0, 0))
            Line((0, 0), (REDONDEO1_R, 0))
        make_face()
    extrude(amount=3)
    with BuildSketch(Plane(origin=(34.715009092, -31.619566863, 0), x_dir=(-0.02602354238357217, 0.999661330272313, 0), z_dir=(0, 0, 1))) as redondeo1_piece_3:
        with BuildLine():
            CenterArc((1.949048389, -1.983269394), REDONDEO1_R, 97.416204182, 81.092588325)
            Line((-0.050274272, -1.93122231), (0, 0))
            ThreePointArc((0, 0), (0.845448142, -0.054792733), (1.690896284, 0))
        make_face()
    extrude(amount=3)
    with BuildSketch(Plane(origin=(-32, -36.278459124, 0), x_dir=(0, -1, 0), z_dir=(0, 0, 1))) as redondeo1_piece_4:
        with BuildLine():
            CenterArc((3.023353256, 2), REDONDEO1_R, 167.846802531, 102.153197469)
            ThreePointArc((1.068176875, 2.421052632), (0.657626025, 1.156021101), (0, 0))
            Line((0, 0), (3.023353256, 0))
        make_face()
    extrude(amount=3)
    with BuildSketch(Plane(origin=(-34.715009092, -31.619566863, 0), x_dir=(0.026023542383658504, 0.9996613302723107, 0), z_dir=(0, 0, 1))) as redondeo1_piece_5:
        with BuildLine():
            CenterArc((1.949048389, 1.983269394), REDONDEO1_R, 181.491207493, 81.092588325)
            Line((-0.050274272, 1.93122231), (0, 0))
            ThreePointArc((0, 0), (0.845448142, 0.054792733), (1.690896284, 0))
        make_face()
    extrude(amount=3)
    with BuildSketch(Plane(origin=(-43, 2.880433137, 0), x_dir=(-0.866025403784439, 0.49999999999999933, 0), z_dir=(0, 0, 1))) as redondeo1_piece_6:
        with BuildLine():
            CenterArc((REDONDEO1_R * 0.57735026919, REDONDEO1_R), REDONDEO1_R, 210, 60)
            Line((-REDONDEO1_R * 0.288675134595, REDONDEO1_R * 0.5), (0, 0))
            Line((0, 0), (REDONDEO1_R * 0.57735026919, 0))
        make_face()
    extrude(amount=3)
    with BuildSketch(Plane(origin=(43, 2.880433137, 0), x_dir=(0.866025403784439, 0.49999999999999933, 0), z_dir=(0, 0, 1))) as redondeo1_piece_7:
        with BuildLine():
            CenterArc((REDONDEO1_R * 0.57735026919, -REDONDEO1_R), REDONDEO1_R, 90, 60)
            Line((-REDONDEO1_R * 0.288675134595, -REDONDEO1_R * 0.5), (0, 0))
            Line((0, 0), (REDONDEO1_R * 0.57735026919, 0))
        make_face()
    extrude(amount=3)
    with BuildSketch(Plane(origin=(38, 3, 0), x_dir=(0, 1, 0), z_dir=(0, 0, 1))) as redondeo1_piece_8:
        with BuildLine():
            CenterArc((REDONDEO1_R, REDONDEO1_R), REDONDEO1_R, 180, 90)
            Line((0, REDONDEO1_R), (0, 0))
            Line((0, 0), (REDONDEO1_R, 0))
        make_face()
    extrude(amount=3)
    with BuildSketch(Plane(origin=(-3, 13.58795555, 0), x_dir=(0, -1, 0), z_dir=(0, 0, 1))) as redondeo1_piece_9:
        with BuildLine():
            CenterArc((2.78032016, -2), REDONDEO1_R, 90, 98.613393798)
            ThreePointArc((0.802877364, -2.299532954), (0.508434809, -1.112408992), (0, 0))
            Line((0, 0), (2.78032016, 0))
        make_face()
    extrude(amount=3)
    with BuildSketch(Plane(origin=(-3, 41.461837479, 0), x_dir=(0, -1, 0), z_dir=(0, 0, 1))) as redondeo1_piece_10:
        with BuildLine():
            CenterArc((2.761053391, -2), REDONDEO1_R, 90, 98.304802099)
            ThreePointArc((0.782026018, -2.28887827), (0.496762606, -1.108308364), (0, 0))
            Line((0, 0), (2.761053391, 0))
        make_face()
    extrude(amount=3)
    with BuildSketch(Plane(origin=(-60, 45.382855566, 0), x_dir=(0, -1, 0), z_dir=(0, 0, 1))) as redondeo1_piece_11:
        with BuildLine():
            CenterArc((2.697955034, 2), REDONDEO1_R, 172.853311138, 97.146688862)
            ThreePointArc((0.713493256, 2.248820123), (0.459632164, 1.091767106), (0, 0))
            Line((0, 0), (2.697955034, 0))
        make_face()
    extrude(amount=3)
    with BuildSketch(Plane(origin=(-26.442382732, 51.009512721, 0), x_dir=(-1, 0, 0), z_dir=(0, 0, 1))) as redondeo1_piece_12:
        with BuildLine():
            CenterArc((1.749622284, 2), REDONDEO1_R, 193.946207215, 76.053792785)
            ThreePointArc((-0.191422576, 1.517978368), (-0.05089194, 0.764641066), (0, 0))
            Line((0, 0), (1.749622284, 0))
        make_face()
    extrude(amount=3)
    with BuildSketch(Plane(origin=(-13.442745995, 51.009512721, 0), x_dir=(-0.12511276967774176, -0.9921425274946963, 0), z_dir=(0, 0, 1))) as redondeo1_piece_13:
        with BuildLine():
            CenterArc((1.765384965, 1.986100214), REDONDEO1_R, 187.187268132, 76.053792785)
            Line((-0.21890009, 1.735874675), (0, 0))
            ThreePointArc((0, 0), (0.765000152, 0.045174304), (1.530000303, 0))
        make_face()
    extrude(amount=3)
    with BuildSketch(Plane(origin=(-11.639238333, 51.009512721, 0), x_dir=(-0.40047050280585245, -0.916309650927255, 0), z_dir=(0, 0, 1))) as redondeo1_piece_14:
        with BuildLine():
            CenterArc((3.039112653, -1.959615623), REDONDEO1_R, 101.533545262, 102.074049912)
            Line((1.206493351, -2.760556629), (0, 0))
            ThreePointArc((0, 0), (1.319614704, -0.133268443), (2.639229409, 0))
        make_face()
    extrude(amount=3)
    with BuildSketch(Plane(origin=(-3, 25.033323272, 0), x_dir=(-0.9441088893447234, 0.329633743813149, 0), z_dir=(0, 0, 1))) as redondeo1_piece_15:
        with BuildLine():
            CenterArc((2.804705122, -1.96565749), REDONDEO1_R, 100.633152949, 98.613393798)
            Line((0.916487343, -2.624924978), (0, 0))
            ThreePointArc((0, 0), (1.217832487, -0.113330282), (2.435664974, 0))
        make_face()
    extrude(amount=3)
    with BuildSketch(Plane(origin=(-60, 19.886895872, 0), x_dir=(0.9558237450549008, 0.29394041639288776, 0), z_dir=(0, 0, 1))) as redondeo1_piece_16:
        with BuildLine():
            CenterArc((2.697460658, 1.967395146), REDONDEO1_R, 162.905989019, 96.734111648)
            Line((0.785813168, 2.555275979), (0, 0))
            ThreePointArc((0, 0), (1.168899619, 0.105965774), (2.337799237, 0))
        make_face()
    extrude(amount=3)
    with BuildSketch(Plane(origin=(-50.59374625, 13.03818727, 0), x_dir=(0.08214816682201194, 0.996620127575087, 0), z_dir=(0, 0, 1))) as redondeo1_piece_17:
        with BuildLine():
            CenterArc((1.270481822, -1.992813203), REDONDEO1_R, 94.858704239, 59.853348925)
            Line((-0.537863042, -1.138477874), (0, 0))
            ThreePointArc((0, 0), (0.550542123, -0.023357091), (1.101084246, 0))
        make_face()
    extrude(amount=3)

    # Redondeo2
    redondeo2_edges = [part.edges().sort_by_distance(p)[0] for p in [
        (-38, 5.767184483, 1.5),
        (38, 5.767184483, 1.5),
    ]]
    fillet(redondeo2_edges, radius=REDONDEO2_R)


solid = part.part
